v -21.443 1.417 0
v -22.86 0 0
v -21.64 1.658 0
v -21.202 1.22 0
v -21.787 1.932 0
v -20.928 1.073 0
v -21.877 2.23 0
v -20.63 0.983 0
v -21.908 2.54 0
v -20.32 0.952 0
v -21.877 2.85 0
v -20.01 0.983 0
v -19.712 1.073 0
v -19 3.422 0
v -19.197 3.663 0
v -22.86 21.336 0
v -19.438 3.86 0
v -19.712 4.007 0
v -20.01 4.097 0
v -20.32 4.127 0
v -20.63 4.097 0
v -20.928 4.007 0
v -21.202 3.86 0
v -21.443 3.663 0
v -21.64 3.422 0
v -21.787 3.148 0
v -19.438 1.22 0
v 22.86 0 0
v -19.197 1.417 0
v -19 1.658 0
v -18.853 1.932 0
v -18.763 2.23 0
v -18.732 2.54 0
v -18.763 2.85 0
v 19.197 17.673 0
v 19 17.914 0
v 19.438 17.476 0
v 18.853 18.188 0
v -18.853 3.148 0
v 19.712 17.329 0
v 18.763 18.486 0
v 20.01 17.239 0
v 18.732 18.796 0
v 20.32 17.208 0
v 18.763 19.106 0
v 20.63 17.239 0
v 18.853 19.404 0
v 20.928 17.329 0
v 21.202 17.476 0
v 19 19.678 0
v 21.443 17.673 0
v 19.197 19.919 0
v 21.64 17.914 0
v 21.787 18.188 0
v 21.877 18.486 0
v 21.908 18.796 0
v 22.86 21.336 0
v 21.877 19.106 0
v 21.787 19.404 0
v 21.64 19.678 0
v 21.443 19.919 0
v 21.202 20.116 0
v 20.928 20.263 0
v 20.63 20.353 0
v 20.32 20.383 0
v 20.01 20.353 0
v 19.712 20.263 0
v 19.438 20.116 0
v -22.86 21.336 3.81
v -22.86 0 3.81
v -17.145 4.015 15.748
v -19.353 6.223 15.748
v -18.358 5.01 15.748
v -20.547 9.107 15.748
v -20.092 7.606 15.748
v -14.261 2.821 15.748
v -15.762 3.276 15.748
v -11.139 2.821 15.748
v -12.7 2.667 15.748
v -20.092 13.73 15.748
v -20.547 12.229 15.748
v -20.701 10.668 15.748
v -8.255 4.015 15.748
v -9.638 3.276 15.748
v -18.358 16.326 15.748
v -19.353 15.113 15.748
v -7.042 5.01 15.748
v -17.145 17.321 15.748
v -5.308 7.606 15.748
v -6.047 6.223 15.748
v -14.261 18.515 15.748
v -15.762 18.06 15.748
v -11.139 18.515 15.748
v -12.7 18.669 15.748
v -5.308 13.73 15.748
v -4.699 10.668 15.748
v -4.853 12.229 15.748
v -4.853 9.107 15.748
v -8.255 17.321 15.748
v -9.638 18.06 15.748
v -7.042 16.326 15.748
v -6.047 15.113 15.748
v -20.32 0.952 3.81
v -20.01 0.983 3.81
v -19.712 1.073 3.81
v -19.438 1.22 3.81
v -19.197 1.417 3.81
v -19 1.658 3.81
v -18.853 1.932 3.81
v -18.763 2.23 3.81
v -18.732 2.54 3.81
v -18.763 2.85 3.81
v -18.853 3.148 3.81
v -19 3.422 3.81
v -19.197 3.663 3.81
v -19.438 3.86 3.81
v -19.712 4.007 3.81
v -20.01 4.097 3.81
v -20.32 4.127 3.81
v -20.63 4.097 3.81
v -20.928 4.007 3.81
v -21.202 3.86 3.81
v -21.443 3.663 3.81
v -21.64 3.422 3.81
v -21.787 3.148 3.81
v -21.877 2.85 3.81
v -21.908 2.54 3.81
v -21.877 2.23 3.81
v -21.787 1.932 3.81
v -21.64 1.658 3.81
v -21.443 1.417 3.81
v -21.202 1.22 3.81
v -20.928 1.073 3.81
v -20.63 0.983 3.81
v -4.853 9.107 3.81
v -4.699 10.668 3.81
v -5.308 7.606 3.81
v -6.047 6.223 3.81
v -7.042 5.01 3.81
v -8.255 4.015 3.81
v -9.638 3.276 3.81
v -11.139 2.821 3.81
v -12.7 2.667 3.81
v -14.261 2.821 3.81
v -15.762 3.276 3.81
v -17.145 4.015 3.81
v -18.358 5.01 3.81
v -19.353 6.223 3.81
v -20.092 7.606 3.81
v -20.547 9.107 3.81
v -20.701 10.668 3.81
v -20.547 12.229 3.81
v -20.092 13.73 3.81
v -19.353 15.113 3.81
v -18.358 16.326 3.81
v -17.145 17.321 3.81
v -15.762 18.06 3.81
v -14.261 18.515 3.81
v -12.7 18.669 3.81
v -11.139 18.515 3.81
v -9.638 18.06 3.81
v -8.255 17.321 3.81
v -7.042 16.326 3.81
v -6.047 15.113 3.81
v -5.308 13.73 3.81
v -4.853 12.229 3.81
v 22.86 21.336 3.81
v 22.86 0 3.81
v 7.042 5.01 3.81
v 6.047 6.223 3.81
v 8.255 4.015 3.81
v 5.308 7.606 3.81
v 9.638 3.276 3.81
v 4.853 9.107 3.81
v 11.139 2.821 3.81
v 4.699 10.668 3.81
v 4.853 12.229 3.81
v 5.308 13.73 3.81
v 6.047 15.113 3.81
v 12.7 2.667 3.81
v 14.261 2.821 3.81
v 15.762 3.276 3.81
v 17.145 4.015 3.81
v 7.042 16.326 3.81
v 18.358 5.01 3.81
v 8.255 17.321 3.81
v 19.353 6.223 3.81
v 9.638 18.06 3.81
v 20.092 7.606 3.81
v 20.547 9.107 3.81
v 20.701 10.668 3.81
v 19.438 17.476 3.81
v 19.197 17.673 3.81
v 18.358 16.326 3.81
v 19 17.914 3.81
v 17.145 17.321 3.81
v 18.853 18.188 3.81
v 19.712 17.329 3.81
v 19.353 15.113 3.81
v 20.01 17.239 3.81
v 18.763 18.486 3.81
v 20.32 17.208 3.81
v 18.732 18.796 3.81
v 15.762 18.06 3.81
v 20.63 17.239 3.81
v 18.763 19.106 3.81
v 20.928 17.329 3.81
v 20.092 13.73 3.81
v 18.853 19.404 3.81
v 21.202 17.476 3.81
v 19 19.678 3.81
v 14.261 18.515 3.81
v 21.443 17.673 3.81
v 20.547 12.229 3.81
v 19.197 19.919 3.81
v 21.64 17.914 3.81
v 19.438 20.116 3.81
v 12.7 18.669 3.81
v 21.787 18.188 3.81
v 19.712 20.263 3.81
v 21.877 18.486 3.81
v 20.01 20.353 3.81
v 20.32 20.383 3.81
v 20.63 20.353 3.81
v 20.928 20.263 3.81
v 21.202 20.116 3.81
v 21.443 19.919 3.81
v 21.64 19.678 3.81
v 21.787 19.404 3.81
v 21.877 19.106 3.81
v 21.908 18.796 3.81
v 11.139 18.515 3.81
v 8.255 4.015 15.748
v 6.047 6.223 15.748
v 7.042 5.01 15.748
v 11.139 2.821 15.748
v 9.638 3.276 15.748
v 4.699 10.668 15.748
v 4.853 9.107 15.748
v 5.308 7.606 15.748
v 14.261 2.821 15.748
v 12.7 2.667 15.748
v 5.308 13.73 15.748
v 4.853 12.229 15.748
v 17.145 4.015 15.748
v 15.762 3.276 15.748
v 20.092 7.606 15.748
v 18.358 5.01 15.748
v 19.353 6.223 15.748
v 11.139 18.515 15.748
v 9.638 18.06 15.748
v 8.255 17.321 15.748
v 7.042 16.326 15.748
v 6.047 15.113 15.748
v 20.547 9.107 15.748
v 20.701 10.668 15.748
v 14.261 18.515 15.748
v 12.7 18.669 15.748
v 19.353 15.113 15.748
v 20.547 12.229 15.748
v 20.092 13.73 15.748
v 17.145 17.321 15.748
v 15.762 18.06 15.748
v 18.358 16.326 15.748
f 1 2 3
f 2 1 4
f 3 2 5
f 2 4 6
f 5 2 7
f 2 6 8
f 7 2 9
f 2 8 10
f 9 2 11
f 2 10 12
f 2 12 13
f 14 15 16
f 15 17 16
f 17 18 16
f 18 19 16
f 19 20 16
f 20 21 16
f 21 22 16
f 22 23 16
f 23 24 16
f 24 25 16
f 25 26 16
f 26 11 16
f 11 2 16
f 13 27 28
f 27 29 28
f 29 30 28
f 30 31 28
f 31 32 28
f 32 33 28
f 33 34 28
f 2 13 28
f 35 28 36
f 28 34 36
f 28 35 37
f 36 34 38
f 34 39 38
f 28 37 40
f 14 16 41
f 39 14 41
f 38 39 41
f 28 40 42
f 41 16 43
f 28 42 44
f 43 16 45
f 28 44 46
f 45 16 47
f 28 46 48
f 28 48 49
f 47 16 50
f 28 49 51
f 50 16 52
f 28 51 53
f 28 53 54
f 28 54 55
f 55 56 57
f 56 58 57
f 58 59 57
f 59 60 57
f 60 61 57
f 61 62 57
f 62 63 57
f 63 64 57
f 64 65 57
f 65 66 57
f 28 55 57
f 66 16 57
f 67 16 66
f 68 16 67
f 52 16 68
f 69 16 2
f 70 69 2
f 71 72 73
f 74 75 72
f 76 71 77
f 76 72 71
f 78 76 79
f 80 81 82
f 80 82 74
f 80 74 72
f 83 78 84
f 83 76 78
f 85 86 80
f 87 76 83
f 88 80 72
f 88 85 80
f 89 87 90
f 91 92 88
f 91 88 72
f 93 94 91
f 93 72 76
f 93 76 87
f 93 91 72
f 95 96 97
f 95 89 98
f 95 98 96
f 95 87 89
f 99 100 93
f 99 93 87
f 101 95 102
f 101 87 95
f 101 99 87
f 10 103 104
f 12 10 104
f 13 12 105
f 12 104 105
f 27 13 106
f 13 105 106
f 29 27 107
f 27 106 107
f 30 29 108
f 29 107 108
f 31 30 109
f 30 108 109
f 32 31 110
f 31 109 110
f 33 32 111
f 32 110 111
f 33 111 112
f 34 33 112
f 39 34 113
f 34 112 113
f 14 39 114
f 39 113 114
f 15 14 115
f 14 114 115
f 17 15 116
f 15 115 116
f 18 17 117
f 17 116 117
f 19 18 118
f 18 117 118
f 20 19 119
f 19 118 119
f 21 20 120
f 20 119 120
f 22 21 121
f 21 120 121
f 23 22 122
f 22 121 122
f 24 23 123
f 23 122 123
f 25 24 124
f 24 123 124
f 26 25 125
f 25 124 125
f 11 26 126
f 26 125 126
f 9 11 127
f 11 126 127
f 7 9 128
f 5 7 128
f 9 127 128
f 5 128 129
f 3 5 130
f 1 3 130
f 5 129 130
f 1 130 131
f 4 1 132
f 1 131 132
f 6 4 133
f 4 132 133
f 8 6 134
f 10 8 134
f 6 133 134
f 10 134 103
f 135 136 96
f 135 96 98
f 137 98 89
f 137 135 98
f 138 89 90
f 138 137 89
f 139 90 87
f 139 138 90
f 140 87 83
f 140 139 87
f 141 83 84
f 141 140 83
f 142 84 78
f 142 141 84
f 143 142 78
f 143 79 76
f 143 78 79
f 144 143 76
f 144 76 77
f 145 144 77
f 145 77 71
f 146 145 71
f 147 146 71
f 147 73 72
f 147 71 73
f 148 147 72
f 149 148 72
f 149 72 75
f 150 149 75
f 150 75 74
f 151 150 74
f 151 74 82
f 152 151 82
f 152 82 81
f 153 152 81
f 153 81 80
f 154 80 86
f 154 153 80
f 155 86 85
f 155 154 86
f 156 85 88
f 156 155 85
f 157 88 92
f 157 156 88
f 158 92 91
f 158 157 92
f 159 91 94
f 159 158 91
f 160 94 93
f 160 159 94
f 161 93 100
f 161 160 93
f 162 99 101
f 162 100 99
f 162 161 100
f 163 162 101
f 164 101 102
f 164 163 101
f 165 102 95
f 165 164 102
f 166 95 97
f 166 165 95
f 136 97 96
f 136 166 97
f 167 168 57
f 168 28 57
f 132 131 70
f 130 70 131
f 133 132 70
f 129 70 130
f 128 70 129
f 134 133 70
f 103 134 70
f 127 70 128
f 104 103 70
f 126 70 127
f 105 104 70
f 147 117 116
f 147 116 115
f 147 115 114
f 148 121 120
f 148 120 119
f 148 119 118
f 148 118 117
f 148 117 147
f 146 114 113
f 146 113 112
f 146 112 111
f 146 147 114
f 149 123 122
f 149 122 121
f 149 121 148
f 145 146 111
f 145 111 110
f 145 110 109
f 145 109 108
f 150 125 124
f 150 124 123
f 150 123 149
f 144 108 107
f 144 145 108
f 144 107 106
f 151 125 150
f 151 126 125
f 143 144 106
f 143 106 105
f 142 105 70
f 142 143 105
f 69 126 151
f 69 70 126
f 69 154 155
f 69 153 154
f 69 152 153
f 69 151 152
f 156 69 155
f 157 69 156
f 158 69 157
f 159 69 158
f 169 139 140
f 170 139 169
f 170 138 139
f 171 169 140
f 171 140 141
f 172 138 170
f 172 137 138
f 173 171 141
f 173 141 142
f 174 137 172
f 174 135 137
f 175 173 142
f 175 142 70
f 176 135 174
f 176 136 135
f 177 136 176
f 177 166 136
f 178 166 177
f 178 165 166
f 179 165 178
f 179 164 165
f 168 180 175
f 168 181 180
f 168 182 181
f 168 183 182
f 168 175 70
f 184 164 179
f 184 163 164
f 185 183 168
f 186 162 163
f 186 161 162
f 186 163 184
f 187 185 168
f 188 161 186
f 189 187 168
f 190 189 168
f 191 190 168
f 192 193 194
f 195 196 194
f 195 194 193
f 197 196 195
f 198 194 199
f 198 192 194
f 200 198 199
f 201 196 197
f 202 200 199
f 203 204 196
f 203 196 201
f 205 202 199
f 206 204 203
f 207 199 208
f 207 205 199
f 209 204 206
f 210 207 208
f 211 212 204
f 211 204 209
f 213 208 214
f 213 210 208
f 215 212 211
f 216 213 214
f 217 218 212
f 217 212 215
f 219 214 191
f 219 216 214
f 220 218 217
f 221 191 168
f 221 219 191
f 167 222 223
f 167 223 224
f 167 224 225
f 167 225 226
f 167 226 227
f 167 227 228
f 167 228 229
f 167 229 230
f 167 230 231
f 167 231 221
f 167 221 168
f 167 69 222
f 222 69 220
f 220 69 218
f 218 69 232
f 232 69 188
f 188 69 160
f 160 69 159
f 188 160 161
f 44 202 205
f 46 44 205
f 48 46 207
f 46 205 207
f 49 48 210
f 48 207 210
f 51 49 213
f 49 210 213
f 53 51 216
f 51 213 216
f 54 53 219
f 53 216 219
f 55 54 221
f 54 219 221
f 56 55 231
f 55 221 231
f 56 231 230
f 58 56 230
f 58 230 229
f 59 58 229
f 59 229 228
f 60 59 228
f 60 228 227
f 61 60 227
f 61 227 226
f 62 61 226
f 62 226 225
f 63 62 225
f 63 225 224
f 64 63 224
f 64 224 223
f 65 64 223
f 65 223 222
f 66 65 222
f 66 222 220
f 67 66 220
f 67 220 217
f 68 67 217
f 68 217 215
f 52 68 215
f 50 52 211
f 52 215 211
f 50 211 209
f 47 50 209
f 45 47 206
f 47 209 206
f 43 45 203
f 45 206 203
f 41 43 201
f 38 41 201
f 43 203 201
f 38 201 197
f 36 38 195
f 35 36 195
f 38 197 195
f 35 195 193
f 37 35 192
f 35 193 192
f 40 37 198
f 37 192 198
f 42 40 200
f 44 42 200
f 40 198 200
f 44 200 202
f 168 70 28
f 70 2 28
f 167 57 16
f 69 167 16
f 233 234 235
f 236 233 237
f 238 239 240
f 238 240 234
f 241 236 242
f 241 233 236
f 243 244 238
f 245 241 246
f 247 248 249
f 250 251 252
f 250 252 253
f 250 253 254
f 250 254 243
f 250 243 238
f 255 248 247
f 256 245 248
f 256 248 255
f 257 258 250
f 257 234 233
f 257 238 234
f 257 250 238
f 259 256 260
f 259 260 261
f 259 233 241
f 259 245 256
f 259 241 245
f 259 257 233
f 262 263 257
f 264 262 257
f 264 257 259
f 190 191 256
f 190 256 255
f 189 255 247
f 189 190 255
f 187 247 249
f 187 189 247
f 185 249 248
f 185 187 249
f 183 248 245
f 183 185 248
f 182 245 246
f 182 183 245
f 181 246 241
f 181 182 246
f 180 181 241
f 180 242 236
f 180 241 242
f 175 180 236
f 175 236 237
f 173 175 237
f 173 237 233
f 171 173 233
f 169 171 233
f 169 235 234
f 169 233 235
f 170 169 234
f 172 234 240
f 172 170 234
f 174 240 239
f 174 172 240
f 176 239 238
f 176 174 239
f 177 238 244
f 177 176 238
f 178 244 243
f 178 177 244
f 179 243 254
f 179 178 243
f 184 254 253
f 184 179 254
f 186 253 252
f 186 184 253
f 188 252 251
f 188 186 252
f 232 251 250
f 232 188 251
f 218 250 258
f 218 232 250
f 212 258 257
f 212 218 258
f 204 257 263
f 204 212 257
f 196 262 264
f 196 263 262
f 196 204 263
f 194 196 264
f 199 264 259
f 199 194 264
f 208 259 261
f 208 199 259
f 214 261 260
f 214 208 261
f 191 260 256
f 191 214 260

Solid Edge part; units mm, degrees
sketch "Sketch1" plane through (0, 0, 0) normal (0, 0, 1) x (1, 0, 0)
  line L0 (-22.86, 0) -> (22.86, 0)
  line L1 (22.86, 0) -> (22.86, 21.336)
  line L2 (22.86, 21.336) -> (-22.86, 21.336)
  line L3 (-22.86, 21.336) -> (-22.86, 0)
  dimension "D1" = 45.72
  dimension "D2" = 21.336
extrude "Protrusion1" add sketch "Sketch1" along normal blind 3.81
sketch "Sketch2" plane through (0, 10.668, 3.81) normal (0, 0, 1) x (1, 0, 0)
  circle A0 centre (12.7, 0) radius 8.001
  circle A1 centre (-12.7, 0) radius 8.001
  dimension "D1" = 16.002
  dimension "D2" = 16.002
  dimension "D3" = 10.16
  dimension "D4" = 10.668
  dimension "D5" = 10.16
extrude "ExtrudedProtrusion_2" add sketch "Sketch2" along normal blind 11.938
hole "Hole_1" at (20.32, 18.796, 3.81) direction (0, 0, -1) diameter 3.175 end up to next
hole "Hole1" at (-20.32, 2.54, 3.81) direction (0, 0, -1) diameter 3.175 end up to next
